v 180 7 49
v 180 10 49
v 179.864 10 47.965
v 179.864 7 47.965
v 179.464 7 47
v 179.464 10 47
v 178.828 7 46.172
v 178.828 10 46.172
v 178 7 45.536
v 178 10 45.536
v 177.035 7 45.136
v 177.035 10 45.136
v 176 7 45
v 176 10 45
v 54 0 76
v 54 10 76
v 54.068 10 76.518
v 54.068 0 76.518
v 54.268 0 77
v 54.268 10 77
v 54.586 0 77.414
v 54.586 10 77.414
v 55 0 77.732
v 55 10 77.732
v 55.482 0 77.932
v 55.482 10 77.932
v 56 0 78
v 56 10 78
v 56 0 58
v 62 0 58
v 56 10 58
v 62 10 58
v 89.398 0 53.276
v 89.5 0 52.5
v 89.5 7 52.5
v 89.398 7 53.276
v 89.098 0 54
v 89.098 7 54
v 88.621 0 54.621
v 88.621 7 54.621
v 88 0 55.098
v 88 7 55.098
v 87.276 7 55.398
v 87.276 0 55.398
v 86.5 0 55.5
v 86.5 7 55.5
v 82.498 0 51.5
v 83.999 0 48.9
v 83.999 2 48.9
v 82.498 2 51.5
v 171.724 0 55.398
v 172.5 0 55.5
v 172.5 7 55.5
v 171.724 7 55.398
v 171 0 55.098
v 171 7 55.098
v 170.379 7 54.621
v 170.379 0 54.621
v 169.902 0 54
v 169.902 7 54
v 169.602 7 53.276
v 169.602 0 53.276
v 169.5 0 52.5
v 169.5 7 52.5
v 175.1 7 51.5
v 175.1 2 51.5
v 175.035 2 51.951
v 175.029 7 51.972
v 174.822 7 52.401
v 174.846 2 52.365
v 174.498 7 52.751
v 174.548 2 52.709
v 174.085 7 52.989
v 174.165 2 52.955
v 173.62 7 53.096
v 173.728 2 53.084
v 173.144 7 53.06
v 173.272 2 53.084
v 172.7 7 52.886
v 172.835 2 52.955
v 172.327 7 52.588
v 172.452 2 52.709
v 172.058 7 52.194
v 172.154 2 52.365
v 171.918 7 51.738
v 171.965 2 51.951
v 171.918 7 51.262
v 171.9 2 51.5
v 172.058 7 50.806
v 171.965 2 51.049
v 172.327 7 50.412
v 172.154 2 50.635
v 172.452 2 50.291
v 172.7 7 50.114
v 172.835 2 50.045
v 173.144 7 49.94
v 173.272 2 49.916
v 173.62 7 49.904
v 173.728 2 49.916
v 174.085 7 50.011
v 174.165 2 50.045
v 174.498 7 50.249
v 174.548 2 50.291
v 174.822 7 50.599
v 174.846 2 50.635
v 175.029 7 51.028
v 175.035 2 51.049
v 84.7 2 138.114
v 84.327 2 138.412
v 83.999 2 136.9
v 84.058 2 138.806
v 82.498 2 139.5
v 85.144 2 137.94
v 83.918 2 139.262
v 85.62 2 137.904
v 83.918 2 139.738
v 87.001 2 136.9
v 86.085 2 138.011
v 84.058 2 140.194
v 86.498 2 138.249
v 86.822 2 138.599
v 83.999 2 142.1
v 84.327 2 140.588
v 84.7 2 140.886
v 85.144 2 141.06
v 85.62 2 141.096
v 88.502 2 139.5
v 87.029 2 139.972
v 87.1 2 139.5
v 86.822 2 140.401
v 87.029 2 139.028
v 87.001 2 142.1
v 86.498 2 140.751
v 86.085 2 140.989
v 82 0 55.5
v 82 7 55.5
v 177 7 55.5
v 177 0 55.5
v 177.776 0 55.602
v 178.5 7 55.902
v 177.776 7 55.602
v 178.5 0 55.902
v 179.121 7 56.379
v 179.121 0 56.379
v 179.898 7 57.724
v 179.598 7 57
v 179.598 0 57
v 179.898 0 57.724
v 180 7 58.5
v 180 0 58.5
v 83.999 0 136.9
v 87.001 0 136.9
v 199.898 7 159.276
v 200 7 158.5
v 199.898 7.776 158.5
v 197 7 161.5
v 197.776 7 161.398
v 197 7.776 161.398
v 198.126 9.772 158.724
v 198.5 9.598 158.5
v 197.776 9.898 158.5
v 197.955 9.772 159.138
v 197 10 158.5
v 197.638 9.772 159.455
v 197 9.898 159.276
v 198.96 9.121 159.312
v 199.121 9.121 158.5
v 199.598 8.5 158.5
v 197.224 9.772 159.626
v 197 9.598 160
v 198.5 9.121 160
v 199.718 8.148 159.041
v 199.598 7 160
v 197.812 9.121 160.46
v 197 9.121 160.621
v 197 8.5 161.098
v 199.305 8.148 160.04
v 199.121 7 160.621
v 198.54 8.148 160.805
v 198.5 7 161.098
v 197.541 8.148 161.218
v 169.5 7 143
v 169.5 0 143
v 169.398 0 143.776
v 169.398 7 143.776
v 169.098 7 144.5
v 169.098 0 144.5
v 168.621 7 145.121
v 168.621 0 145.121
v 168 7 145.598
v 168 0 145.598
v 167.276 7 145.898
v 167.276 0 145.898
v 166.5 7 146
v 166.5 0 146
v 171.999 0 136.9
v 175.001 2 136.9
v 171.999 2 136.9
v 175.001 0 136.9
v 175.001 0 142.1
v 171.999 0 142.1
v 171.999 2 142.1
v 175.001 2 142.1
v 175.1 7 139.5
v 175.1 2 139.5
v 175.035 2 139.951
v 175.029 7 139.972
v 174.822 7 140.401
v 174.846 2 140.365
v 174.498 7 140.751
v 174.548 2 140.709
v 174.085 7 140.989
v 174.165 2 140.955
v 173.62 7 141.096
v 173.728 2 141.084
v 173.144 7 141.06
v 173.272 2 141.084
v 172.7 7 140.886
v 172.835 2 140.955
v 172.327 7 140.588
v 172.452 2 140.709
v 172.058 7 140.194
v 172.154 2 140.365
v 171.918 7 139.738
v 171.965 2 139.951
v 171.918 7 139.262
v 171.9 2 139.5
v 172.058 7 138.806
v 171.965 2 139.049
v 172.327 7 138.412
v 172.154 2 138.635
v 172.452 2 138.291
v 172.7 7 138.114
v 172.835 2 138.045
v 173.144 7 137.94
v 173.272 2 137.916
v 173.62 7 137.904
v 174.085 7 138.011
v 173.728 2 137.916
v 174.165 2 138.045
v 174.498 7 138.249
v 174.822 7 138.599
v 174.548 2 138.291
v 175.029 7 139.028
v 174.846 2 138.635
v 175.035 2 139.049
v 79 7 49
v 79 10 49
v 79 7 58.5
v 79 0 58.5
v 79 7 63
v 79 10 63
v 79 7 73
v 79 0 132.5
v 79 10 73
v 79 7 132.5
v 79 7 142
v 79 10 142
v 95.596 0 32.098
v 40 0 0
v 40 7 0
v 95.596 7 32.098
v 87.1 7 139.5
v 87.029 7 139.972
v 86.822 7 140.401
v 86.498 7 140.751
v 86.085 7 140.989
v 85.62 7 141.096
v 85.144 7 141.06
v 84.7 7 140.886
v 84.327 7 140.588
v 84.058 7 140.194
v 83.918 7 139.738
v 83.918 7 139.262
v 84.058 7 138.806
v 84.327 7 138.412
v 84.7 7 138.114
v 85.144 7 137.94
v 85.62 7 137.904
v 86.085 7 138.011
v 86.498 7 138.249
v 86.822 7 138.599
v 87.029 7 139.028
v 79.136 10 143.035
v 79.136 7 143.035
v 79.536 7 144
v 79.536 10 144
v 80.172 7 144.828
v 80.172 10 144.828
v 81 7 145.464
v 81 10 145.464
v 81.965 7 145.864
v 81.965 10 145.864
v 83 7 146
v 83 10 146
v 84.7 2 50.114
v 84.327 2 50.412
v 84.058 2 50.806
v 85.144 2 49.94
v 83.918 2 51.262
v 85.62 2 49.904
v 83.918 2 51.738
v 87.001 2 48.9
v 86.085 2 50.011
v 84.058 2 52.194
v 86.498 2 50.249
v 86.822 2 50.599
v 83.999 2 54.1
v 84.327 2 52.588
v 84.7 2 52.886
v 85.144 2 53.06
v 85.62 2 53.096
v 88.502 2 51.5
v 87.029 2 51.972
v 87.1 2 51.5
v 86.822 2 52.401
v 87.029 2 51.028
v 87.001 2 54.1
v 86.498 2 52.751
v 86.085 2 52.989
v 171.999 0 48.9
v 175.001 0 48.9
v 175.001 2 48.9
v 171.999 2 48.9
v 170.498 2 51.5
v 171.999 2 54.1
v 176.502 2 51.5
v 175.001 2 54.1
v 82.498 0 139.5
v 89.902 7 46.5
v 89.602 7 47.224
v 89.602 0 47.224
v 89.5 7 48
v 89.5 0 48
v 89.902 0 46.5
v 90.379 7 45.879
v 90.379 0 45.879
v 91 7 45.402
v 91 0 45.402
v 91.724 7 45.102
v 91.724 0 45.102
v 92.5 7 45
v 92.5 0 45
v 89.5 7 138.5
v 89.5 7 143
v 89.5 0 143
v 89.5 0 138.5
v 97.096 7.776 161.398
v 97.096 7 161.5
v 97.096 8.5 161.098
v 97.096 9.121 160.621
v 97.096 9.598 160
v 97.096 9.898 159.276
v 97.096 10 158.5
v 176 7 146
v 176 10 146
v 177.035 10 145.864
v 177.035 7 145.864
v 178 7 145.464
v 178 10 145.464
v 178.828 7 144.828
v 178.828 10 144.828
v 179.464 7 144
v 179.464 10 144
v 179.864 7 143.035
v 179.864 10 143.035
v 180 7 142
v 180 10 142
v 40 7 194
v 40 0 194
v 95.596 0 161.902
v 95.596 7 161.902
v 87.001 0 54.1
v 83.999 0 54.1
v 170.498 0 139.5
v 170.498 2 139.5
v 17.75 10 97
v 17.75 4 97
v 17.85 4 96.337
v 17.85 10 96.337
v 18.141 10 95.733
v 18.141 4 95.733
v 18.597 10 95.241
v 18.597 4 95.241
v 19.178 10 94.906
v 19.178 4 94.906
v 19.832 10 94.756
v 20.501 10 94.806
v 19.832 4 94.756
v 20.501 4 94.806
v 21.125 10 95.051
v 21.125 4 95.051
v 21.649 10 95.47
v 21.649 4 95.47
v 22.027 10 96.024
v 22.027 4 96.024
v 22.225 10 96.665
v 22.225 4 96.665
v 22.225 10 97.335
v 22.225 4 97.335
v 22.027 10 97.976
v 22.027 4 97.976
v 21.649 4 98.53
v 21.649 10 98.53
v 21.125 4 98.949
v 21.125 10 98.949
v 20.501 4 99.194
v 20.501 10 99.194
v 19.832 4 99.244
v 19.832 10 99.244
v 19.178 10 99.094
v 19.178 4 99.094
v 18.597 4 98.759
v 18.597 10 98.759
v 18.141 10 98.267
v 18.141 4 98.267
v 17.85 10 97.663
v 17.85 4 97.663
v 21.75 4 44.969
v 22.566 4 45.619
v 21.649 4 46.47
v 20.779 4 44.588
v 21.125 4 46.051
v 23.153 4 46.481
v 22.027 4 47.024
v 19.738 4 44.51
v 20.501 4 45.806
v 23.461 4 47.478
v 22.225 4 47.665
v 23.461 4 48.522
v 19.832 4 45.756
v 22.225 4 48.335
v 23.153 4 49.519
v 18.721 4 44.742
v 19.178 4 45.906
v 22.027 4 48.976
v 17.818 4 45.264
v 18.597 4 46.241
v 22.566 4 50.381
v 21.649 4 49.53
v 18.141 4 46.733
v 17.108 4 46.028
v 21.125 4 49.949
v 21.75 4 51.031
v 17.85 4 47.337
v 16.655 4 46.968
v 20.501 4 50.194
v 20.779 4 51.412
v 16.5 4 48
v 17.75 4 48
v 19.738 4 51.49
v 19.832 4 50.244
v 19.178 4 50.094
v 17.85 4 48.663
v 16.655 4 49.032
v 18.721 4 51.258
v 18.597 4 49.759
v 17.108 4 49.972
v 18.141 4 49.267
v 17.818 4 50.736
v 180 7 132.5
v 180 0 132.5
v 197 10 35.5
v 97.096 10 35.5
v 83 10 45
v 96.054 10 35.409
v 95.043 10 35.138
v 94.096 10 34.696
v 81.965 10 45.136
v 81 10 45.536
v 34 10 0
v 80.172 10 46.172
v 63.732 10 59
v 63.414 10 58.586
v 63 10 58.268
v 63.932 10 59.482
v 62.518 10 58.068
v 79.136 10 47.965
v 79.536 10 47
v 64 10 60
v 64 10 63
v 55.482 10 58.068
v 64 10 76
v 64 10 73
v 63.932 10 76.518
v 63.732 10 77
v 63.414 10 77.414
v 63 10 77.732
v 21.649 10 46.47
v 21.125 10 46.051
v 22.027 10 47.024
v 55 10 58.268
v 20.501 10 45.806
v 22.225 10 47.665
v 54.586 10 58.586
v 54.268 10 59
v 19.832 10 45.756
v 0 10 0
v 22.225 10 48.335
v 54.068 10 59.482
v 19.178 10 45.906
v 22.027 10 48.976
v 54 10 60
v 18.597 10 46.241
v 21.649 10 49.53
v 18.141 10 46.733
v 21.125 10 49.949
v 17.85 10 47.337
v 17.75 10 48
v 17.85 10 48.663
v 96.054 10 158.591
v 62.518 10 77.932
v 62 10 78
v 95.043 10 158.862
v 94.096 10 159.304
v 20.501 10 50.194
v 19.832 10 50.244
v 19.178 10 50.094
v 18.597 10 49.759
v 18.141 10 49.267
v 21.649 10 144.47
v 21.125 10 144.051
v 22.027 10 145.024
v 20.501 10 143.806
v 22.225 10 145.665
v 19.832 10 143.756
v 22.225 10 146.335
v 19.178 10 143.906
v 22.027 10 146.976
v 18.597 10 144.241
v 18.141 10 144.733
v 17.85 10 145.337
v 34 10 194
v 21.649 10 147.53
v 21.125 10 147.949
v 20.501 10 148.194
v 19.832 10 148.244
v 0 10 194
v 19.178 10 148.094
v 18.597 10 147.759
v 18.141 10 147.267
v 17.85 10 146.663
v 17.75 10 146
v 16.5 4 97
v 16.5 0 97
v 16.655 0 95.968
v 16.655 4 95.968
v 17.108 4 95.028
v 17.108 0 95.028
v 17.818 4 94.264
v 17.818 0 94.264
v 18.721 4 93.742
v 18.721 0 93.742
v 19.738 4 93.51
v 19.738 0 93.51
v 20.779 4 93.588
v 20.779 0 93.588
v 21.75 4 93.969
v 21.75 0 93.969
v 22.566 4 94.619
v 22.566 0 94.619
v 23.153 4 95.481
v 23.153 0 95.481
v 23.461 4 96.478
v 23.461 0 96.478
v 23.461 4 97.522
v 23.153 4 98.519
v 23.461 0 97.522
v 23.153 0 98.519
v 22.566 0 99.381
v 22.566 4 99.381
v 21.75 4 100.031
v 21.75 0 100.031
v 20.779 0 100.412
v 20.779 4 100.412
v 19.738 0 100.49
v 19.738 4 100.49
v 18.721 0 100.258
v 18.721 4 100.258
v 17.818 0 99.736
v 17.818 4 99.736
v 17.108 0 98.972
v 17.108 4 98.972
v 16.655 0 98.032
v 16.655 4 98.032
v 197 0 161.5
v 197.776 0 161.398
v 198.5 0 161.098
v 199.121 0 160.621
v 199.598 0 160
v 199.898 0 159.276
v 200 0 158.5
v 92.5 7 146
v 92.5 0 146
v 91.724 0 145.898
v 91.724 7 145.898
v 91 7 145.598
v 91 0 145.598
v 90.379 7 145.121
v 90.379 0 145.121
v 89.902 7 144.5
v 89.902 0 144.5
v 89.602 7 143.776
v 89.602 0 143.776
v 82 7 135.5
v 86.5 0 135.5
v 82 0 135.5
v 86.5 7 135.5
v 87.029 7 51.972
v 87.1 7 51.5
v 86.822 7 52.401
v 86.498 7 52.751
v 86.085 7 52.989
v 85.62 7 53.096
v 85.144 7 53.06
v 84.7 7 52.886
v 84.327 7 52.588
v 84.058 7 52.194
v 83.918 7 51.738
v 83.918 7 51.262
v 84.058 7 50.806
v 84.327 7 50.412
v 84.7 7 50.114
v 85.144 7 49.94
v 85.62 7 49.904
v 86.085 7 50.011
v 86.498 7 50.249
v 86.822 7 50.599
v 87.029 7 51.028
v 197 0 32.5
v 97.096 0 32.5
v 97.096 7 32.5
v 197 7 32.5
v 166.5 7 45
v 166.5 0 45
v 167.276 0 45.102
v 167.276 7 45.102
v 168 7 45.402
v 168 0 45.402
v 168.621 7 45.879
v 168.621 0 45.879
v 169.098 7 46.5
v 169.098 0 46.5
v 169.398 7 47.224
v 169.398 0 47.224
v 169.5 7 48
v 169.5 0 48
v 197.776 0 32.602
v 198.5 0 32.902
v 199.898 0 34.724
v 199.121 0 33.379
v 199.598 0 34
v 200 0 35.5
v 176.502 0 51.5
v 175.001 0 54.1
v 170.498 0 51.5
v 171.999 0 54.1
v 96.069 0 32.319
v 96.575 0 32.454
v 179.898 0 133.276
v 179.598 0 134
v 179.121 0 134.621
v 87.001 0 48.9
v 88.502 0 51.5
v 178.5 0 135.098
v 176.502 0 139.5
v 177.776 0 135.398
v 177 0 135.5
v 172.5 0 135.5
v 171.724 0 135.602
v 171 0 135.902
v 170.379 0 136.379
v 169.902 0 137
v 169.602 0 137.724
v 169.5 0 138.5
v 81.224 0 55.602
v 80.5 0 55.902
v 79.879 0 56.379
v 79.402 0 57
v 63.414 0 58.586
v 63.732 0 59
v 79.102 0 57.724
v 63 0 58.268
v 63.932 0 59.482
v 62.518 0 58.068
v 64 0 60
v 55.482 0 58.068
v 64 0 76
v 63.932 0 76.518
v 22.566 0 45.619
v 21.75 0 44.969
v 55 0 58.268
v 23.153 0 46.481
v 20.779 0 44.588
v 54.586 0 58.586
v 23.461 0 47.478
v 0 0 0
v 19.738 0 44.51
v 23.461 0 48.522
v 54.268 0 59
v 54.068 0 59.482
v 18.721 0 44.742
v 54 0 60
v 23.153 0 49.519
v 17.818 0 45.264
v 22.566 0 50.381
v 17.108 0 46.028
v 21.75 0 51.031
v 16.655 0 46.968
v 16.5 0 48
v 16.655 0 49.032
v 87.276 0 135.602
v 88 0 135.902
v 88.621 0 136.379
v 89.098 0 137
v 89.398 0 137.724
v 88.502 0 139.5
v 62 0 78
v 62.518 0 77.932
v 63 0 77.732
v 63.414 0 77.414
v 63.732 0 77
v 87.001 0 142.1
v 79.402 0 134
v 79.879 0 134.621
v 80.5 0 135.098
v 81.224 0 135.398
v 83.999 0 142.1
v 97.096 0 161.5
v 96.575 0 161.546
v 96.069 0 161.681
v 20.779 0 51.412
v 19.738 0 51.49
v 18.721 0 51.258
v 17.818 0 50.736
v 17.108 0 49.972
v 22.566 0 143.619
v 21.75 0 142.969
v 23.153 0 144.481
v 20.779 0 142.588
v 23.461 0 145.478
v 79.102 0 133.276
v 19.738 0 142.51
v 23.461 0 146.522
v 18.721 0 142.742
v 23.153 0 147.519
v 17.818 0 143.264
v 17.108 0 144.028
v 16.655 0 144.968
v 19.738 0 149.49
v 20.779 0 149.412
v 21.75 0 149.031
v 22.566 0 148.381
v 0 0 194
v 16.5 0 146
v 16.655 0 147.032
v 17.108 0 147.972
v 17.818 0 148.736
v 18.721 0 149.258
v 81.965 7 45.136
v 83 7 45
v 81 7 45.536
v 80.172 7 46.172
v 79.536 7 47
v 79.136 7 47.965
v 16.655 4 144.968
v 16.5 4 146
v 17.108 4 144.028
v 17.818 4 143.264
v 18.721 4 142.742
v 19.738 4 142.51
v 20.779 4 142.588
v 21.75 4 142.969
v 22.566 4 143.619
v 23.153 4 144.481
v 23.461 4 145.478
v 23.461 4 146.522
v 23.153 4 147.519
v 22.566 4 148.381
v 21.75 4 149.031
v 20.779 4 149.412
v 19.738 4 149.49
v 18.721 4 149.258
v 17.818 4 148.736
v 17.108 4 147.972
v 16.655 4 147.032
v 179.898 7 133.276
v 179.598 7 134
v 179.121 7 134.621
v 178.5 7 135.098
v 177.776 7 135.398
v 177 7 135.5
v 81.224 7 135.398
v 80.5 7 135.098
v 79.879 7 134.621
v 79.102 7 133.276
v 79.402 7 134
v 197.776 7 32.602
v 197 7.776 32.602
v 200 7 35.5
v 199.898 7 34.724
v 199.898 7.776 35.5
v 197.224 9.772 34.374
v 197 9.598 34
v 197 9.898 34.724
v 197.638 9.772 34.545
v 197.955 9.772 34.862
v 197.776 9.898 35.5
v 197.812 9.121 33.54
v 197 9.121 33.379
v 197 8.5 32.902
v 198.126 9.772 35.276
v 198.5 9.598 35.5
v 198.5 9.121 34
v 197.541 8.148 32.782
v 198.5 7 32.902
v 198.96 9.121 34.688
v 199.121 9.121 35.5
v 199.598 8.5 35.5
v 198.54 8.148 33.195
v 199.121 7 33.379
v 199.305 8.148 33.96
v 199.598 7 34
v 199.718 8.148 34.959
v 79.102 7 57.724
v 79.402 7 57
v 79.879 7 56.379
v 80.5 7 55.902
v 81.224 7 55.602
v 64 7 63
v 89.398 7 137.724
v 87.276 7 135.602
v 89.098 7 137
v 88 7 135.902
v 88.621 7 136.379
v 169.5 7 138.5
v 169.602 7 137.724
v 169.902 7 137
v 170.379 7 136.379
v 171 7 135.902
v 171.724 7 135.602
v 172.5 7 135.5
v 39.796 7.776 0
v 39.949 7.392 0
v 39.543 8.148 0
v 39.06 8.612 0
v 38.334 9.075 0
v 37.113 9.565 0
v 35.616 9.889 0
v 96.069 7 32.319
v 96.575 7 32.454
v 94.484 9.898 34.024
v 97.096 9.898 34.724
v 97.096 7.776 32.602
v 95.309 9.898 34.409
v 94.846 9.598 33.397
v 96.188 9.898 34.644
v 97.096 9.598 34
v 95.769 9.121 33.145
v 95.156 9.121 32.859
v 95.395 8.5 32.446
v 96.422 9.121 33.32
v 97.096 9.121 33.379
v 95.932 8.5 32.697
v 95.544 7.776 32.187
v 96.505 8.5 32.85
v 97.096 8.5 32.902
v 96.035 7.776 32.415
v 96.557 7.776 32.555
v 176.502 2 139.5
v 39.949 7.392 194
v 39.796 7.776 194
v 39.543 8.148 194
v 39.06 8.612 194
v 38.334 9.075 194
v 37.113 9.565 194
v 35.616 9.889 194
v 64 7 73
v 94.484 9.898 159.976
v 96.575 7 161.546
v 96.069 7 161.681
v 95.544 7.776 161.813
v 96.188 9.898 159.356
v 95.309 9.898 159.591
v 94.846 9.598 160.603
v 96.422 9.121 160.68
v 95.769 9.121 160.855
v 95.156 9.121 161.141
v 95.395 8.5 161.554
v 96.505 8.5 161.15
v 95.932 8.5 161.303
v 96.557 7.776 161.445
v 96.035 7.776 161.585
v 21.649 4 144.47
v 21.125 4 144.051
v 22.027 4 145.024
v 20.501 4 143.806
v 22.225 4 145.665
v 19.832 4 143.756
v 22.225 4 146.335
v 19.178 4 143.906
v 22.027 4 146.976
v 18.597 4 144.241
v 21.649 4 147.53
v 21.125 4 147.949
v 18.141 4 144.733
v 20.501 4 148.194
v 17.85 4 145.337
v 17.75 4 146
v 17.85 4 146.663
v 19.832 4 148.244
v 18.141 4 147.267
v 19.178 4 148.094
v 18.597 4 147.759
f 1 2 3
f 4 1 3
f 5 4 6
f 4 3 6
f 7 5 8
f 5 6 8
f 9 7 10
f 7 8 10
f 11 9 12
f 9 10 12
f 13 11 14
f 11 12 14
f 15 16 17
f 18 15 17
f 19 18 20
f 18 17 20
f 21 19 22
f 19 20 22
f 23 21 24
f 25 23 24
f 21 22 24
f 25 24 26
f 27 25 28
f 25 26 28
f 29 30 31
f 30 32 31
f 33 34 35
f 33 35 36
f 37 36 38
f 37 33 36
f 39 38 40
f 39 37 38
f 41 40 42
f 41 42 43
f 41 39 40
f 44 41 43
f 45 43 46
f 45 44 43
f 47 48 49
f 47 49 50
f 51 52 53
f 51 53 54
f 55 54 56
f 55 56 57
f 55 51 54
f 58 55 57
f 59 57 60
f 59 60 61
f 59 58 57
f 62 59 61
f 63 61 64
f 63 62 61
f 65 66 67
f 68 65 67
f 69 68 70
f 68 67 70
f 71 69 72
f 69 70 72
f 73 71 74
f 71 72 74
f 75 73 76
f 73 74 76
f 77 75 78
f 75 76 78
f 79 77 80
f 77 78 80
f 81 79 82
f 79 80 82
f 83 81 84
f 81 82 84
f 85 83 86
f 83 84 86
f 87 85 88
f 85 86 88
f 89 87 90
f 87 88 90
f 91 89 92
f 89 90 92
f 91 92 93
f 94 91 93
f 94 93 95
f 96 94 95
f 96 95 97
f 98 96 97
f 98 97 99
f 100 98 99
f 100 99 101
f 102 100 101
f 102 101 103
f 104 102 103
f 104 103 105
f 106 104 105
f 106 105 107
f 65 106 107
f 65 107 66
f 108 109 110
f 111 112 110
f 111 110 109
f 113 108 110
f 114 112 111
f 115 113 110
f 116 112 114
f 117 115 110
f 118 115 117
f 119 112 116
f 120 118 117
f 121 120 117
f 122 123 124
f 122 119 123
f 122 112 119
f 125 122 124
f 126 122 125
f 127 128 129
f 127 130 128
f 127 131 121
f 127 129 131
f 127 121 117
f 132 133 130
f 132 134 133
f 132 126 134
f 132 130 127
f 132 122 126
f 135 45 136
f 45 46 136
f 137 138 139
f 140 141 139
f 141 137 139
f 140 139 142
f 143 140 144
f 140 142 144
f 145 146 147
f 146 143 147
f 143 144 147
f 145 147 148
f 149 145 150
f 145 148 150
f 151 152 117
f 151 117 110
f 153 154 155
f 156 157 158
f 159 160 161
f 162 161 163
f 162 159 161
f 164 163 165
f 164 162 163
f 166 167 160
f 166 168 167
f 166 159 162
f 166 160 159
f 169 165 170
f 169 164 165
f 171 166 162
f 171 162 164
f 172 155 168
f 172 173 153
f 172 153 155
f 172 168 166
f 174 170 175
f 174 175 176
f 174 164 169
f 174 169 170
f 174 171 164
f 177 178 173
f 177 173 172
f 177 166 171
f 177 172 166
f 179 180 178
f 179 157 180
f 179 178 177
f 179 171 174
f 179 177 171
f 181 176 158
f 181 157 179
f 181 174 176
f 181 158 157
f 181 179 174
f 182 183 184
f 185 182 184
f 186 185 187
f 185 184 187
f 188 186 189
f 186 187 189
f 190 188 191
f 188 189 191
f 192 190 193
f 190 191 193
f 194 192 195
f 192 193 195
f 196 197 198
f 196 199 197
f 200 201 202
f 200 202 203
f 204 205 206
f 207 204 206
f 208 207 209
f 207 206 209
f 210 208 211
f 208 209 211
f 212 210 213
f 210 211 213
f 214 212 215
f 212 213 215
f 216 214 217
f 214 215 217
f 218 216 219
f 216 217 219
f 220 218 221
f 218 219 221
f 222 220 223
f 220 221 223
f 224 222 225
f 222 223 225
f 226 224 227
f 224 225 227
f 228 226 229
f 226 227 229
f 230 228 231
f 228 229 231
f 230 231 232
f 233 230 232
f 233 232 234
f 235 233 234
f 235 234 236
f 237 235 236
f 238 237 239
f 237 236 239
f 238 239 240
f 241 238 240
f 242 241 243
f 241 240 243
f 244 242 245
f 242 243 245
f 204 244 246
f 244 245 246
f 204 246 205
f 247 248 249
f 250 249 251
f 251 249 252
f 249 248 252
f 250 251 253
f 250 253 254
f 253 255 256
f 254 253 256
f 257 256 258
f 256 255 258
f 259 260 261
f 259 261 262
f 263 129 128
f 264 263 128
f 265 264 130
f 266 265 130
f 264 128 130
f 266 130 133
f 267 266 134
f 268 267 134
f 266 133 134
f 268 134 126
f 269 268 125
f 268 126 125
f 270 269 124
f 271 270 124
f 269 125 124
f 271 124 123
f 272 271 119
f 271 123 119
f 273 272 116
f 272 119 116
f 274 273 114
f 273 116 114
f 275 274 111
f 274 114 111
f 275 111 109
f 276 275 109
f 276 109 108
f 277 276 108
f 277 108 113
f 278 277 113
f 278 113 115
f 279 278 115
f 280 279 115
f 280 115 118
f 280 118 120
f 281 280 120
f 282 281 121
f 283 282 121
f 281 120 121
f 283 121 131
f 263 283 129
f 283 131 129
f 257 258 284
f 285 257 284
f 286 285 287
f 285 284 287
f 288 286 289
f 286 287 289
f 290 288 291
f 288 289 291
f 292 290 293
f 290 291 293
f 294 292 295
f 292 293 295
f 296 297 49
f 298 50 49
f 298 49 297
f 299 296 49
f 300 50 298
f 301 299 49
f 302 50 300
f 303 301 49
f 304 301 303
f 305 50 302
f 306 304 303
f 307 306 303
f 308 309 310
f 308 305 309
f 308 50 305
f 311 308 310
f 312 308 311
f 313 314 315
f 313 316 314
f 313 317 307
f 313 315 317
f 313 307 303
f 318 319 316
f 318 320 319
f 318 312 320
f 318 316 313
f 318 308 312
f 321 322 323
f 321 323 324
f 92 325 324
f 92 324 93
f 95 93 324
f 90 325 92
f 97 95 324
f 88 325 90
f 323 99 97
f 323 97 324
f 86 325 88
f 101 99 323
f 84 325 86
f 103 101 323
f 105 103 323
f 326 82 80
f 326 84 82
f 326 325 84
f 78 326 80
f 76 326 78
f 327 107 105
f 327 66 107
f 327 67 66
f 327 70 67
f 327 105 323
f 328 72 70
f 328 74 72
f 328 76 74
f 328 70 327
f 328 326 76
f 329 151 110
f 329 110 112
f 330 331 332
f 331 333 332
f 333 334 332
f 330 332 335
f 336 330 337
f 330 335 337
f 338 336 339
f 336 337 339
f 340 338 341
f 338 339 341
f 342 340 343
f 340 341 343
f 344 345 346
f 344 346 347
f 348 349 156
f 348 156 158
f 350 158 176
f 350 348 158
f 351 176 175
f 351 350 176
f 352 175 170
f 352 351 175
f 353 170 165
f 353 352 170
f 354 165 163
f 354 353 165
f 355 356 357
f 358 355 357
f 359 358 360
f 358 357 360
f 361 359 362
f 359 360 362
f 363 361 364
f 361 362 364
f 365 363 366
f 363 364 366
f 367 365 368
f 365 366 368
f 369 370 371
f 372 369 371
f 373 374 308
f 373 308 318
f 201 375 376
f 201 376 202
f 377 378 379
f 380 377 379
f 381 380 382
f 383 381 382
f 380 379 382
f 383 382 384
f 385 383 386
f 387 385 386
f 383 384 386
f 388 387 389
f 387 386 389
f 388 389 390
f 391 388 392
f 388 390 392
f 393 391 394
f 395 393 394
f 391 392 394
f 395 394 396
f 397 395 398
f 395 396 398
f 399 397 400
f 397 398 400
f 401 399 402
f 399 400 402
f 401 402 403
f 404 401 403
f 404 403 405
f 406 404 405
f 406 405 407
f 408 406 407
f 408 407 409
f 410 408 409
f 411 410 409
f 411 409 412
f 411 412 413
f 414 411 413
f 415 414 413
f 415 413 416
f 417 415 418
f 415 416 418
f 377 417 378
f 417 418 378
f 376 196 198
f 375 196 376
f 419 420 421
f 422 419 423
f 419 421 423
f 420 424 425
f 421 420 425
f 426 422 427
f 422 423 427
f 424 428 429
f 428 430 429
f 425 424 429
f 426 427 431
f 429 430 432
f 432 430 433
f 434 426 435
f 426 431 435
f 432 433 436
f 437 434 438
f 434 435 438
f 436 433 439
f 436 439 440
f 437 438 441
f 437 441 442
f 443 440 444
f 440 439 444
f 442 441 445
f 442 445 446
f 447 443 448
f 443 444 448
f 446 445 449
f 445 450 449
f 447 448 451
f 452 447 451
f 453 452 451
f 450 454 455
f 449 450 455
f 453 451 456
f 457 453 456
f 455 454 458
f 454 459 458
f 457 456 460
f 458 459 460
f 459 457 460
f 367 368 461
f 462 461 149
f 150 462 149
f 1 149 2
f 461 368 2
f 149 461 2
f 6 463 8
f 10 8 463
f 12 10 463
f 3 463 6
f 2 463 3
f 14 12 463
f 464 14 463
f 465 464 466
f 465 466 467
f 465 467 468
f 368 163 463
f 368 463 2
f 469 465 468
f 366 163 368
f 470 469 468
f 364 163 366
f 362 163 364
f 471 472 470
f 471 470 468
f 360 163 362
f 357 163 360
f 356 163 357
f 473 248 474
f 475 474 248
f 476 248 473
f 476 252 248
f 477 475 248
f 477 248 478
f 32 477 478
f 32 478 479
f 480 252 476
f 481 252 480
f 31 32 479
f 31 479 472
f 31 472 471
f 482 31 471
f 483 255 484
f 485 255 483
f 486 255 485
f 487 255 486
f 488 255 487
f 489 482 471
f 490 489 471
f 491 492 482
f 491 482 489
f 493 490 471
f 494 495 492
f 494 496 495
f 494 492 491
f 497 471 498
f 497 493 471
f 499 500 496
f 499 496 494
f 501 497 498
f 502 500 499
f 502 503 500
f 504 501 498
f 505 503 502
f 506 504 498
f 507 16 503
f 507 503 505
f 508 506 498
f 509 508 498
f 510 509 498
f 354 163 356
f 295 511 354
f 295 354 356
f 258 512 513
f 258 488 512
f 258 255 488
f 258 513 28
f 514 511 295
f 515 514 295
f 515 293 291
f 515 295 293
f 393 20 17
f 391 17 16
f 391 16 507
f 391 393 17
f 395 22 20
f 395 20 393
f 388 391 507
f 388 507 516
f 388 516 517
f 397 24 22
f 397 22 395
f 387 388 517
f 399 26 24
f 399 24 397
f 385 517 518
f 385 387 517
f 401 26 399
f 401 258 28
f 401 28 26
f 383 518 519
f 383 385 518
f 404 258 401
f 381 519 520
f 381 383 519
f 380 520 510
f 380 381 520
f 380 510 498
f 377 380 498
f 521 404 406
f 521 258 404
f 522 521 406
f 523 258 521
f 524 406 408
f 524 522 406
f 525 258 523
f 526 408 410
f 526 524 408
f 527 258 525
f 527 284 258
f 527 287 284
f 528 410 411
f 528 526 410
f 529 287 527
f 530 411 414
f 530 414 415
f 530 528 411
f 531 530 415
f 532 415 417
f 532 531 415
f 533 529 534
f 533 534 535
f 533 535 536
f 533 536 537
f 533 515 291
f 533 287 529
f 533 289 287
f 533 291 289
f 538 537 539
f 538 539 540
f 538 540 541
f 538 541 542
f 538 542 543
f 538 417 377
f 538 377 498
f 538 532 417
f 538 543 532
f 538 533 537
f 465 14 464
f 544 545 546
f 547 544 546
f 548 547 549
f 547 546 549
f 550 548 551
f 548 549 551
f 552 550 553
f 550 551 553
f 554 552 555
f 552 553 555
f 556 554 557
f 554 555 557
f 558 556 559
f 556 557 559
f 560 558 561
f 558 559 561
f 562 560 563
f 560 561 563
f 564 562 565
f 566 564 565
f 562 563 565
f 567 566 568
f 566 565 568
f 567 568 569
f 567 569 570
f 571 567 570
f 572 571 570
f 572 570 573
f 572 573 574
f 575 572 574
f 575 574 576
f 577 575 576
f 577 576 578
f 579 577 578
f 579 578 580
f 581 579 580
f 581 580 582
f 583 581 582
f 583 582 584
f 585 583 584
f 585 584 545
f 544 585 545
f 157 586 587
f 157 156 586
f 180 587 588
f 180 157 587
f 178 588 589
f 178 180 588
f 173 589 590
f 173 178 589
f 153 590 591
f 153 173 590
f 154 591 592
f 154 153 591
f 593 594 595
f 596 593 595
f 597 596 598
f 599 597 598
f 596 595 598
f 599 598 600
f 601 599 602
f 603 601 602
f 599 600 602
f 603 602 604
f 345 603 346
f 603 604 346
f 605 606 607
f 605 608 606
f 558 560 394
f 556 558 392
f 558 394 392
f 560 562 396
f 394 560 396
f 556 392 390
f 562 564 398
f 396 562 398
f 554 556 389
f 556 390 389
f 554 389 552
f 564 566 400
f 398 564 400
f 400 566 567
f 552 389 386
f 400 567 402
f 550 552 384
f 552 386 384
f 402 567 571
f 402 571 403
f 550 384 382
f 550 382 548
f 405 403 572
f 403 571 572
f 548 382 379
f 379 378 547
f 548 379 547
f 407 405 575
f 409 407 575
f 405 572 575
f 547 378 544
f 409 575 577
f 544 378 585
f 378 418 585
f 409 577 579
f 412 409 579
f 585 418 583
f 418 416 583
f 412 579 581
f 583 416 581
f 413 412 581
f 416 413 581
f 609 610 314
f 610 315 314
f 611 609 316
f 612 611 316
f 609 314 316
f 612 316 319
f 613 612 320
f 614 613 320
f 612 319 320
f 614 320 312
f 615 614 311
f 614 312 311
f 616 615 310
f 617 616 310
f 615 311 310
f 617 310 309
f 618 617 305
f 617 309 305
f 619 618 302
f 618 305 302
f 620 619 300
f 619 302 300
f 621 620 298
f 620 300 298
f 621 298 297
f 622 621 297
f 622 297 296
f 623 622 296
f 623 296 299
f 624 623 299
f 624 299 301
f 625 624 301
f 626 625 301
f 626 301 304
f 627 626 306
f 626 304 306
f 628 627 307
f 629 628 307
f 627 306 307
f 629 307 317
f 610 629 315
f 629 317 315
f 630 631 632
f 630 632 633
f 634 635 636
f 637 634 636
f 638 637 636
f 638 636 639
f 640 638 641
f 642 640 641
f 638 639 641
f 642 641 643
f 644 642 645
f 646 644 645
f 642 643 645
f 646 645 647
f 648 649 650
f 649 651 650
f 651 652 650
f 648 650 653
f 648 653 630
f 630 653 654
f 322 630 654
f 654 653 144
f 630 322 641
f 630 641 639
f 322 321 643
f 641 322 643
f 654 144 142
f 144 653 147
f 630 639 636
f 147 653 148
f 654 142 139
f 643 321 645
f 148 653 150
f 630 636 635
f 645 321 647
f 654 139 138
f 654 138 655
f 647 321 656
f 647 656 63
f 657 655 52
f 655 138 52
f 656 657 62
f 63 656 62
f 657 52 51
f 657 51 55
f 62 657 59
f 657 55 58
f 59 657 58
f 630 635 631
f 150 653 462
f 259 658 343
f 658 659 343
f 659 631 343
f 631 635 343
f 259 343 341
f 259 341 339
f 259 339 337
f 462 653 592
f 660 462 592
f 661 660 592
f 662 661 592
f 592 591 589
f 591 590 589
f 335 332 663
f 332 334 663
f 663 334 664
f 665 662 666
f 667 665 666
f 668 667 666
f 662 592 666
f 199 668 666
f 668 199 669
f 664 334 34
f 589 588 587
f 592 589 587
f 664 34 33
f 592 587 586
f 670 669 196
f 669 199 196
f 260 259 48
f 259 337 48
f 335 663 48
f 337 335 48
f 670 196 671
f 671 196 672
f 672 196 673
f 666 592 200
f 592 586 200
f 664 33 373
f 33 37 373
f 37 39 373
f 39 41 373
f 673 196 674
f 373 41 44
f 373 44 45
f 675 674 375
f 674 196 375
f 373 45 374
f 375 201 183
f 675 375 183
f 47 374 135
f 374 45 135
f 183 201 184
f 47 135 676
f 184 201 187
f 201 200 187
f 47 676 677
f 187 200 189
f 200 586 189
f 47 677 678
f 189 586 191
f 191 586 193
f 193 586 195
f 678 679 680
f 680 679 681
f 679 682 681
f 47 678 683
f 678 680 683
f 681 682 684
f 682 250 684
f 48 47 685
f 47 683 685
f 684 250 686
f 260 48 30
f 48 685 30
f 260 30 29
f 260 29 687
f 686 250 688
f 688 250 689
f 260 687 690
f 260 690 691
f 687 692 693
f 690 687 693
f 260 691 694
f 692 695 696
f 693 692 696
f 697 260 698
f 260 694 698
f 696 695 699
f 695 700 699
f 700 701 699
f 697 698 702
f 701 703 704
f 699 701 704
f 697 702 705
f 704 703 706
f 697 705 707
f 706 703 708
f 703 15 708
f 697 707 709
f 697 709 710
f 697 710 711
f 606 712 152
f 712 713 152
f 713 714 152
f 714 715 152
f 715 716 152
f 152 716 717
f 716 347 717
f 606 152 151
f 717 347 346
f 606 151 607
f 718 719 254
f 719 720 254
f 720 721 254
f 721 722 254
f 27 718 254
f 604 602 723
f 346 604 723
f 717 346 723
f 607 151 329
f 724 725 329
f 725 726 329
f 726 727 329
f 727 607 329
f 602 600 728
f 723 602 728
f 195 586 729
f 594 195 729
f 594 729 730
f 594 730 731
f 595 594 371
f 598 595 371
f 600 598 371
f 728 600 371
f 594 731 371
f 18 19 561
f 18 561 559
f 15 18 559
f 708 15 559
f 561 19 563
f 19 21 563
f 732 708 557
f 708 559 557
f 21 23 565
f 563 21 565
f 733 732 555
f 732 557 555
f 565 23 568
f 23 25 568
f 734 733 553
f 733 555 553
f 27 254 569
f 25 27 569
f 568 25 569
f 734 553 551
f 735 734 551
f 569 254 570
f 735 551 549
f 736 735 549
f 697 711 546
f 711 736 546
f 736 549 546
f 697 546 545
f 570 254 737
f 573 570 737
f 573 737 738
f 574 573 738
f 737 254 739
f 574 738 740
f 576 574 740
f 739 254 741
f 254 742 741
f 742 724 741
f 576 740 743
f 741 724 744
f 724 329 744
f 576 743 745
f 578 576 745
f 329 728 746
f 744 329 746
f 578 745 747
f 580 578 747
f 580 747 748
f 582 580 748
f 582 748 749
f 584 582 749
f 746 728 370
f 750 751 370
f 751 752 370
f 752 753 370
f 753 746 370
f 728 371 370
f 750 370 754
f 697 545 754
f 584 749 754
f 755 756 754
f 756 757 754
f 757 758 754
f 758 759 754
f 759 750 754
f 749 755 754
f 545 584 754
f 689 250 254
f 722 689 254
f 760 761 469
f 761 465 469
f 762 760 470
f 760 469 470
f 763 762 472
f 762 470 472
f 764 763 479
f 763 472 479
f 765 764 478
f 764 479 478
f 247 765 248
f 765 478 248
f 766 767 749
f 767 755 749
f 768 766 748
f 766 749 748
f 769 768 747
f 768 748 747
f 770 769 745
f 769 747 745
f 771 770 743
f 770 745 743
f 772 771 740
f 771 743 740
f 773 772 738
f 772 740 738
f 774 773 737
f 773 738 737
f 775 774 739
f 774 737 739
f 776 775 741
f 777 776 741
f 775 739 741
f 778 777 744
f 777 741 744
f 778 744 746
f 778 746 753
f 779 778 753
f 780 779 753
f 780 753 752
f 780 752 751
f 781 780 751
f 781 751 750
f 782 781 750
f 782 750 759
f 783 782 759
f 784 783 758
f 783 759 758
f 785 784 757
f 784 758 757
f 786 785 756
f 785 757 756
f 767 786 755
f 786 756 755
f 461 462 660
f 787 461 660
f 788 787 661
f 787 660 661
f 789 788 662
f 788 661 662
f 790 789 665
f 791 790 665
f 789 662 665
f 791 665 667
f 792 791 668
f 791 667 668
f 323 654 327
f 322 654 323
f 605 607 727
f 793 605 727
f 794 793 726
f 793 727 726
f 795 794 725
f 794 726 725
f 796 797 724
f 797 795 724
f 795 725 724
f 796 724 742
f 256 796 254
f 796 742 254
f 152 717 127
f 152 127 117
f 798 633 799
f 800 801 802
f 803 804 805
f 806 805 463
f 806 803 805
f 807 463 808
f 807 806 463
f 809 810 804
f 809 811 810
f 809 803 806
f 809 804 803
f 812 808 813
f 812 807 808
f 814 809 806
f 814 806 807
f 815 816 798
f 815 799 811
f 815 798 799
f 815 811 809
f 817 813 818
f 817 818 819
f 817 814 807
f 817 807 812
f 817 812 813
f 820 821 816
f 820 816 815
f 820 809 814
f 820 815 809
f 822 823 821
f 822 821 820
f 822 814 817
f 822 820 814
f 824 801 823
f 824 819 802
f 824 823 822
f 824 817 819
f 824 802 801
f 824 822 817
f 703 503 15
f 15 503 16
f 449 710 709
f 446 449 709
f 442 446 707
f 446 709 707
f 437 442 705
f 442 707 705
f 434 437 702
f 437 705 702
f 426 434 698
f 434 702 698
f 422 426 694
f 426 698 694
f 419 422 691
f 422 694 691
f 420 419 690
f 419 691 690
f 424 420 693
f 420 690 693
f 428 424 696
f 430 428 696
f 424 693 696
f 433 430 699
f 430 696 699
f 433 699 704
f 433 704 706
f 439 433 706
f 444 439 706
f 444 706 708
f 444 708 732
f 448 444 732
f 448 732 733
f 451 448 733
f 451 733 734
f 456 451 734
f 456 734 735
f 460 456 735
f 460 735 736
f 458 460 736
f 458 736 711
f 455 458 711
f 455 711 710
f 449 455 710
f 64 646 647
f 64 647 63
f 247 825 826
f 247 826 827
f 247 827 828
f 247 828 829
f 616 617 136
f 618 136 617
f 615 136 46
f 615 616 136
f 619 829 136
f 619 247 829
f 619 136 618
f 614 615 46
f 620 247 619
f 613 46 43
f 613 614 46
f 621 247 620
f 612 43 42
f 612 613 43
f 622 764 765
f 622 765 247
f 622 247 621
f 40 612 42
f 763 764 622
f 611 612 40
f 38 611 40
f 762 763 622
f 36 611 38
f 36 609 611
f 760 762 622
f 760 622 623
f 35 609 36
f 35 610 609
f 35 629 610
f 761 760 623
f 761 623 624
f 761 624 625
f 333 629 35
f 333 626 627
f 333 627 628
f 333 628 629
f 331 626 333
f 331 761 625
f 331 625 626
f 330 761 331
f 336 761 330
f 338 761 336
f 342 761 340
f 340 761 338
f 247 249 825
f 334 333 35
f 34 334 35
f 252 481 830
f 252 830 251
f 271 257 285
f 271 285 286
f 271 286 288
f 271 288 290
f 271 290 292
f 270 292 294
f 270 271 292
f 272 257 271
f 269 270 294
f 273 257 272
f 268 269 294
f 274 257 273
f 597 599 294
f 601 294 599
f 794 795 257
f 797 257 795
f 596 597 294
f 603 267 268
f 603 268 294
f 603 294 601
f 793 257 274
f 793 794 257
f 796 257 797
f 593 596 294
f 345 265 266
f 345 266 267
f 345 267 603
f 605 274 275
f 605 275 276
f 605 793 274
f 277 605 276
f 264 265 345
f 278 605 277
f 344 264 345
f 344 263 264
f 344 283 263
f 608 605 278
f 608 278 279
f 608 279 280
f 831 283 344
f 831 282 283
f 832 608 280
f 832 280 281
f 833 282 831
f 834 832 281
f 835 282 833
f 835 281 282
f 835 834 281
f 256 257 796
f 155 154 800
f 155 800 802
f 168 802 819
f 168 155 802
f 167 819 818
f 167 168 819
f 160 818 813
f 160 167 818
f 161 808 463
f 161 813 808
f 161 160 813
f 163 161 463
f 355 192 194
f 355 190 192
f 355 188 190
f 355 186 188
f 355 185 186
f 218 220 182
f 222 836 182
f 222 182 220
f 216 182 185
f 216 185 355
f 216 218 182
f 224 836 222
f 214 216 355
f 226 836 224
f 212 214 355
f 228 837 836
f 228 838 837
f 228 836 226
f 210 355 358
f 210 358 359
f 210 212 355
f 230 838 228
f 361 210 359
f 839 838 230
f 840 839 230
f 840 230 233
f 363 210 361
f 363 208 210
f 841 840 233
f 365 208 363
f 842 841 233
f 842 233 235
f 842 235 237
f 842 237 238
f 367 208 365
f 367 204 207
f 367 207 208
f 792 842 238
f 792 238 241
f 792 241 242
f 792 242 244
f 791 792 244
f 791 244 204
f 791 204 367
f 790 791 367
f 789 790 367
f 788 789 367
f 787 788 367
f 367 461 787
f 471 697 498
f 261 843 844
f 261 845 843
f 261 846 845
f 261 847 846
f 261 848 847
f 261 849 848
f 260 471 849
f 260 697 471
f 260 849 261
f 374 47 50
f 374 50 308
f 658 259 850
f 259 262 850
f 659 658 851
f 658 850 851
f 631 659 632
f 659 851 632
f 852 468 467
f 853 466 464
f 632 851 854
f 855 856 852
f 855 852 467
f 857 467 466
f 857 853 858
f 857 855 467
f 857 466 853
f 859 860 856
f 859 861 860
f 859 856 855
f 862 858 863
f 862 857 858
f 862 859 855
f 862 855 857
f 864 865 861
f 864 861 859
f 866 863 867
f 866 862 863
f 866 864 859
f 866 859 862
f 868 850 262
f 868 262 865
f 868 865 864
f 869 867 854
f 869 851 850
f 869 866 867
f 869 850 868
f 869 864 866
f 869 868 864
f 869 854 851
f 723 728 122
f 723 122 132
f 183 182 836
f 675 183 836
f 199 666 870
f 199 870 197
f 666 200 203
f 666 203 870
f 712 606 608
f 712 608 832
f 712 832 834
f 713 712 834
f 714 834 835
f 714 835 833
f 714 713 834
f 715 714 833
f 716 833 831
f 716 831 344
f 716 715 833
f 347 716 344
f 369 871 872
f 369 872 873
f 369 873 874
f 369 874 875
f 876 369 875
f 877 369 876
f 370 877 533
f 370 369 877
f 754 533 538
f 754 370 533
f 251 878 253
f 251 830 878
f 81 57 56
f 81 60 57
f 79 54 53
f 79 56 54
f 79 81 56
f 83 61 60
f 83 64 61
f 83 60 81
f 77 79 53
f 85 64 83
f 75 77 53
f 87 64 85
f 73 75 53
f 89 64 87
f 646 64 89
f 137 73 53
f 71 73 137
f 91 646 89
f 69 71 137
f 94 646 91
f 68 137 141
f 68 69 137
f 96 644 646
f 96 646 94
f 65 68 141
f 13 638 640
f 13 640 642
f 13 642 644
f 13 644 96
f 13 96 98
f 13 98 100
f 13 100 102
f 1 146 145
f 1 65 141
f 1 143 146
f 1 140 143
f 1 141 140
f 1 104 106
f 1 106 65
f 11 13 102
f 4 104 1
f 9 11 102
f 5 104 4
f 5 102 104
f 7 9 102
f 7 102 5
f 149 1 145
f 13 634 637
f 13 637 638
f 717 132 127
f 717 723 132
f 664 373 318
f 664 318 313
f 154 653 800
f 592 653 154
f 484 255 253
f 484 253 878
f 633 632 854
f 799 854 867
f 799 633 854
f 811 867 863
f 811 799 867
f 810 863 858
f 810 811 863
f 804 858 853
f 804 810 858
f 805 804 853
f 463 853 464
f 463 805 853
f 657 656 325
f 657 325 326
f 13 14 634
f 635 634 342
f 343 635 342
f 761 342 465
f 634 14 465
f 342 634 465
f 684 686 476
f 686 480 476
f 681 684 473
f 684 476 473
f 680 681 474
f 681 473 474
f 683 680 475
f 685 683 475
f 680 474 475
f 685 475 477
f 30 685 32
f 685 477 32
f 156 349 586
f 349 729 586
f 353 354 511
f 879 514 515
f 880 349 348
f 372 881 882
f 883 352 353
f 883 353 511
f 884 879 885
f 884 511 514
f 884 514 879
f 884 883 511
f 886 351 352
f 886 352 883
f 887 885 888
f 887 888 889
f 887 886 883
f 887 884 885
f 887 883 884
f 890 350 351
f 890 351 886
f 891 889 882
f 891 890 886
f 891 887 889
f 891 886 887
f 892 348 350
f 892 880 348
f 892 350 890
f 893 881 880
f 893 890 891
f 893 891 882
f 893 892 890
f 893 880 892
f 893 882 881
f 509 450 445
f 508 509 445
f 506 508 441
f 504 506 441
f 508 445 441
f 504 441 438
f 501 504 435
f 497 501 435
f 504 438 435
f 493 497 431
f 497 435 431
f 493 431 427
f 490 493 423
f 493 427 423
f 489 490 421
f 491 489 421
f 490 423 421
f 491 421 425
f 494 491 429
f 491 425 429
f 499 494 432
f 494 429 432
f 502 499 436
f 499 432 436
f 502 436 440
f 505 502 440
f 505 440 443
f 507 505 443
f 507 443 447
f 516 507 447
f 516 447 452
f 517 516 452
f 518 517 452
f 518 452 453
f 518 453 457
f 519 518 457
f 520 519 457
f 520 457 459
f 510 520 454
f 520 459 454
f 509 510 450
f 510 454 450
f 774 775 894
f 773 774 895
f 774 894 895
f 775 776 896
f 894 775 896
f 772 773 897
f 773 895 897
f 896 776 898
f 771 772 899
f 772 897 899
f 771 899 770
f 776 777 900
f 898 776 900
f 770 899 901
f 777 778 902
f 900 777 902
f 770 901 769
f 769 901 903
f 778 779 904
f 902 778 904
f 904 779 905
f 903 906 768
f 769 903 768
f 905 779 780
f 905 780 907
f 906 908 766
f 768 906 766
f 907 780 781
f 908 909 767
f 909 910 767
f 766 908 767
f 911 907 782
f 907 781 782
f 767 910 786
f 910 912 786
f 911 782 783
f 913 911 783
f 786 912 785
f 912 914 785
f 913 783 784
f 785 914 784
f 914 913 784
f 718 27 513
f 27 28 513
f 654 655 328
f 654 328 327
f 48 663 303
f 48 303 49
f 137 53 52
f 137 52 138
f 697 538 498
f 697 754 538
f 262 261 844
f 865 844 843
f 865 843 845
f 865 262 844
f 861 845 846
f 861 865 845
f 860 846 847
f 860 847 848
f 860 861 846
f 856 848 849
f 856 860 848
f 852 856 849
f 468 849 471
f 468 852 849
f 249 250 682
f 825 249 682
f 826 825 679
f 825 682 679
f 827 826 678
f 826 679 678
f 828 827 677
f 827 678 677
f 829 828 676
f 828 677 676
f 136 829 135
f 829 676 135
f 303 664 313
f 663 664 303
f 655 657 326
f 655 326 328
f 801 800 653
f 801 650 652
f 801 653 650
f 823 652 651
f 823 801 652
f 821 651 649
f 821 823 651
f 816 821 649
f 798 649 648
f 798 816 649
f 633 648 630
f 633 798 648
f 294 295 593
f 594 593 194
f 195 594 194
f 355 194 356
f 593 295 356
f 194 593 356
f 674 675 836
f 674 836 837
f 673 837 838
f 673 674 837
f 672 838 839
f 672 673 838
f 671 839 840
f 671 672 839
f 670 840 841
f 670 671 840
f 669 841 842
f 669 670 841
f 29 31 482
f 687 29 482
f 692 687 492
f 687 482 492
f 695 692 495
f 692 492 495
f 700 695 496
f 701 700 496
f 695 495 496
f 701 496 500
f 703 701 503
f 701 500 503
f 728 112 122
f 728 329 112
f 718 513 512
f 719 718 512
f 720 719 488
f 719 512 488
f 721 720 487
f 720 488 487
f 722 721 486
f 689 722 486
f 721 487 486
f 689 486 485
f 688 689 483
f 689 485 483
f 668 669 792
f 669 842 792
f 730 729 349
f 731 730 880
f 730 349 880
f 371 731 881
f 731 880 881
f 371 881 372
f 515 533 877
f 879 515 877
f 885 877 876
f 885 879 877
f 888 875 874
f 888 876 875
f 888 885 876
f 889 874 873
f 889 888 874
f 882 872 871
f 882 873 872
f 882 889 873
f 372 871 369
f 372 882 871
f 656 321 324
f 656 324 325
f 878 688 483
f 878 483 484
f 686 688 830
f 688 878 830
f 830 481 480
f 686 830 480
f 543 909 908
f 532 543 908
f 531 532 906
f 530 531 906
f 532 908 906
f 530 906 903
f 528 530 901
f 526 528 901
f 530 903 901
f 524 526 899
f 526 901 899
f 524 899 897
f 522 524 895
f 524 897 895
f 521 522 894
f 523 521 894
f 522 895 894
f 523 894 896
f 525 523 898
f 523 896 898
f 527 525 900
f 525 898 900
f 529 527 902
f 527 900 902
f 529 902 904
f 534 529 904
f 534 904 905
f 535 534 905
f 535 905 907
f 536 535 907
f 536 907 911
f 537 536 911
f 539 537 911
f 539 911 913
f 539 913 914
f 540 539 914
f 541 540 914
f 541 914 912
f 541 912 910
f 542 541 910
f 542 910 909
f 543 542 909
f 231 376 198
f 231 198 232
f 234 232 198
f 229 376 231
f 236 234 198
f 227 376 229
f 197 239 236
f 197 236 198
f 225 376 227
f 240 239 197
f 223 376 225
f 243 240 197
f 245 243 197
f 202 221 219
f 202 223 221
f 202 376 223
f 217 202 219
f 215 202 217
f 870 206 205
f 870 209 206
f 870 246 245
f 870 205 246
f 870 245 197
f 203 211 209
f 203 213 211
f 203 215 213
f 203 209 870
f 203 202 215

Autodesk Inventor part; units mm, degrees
ref_plane "YZ Plane" through (0, 0, 0) normal (1, 0, 0) x (0, 1, 0)
ref_plane "XZ Plane" through (0, 0, 0) normal (0, 1, 0) x (-1, 0, 0)
ref_plane "XY Plane" through (0, 0, 0) normal (0, 0, 1) x (1, 0, 0)
sketch "스케치1" plane through (0, 0, 0) normal (0, 1, 0) x (-1, 0, 0)
  line L0 (0, 0) -> (-206, 0)
  line L1 (-210, 4) -> (-210, 190)
  line L2 (-206, 194) -> (0, 194)
  line L3 (0, 194) -> (0, 0)
  line L4 (-40, 0) -> (-40, 194)
  line L5 (-20, 0) -> (-20, 194)
  circle A0 centre (-20, 97) radius 3.5
  circle A1 centre (-20, 48) radius 3.5
  circle A2 centre (-20, 146) radius 3.5
  arc A3 (-210, 4) -> (-206, 0) centre (-206, 4) ccw
  arc A4 (-206, 194) -> (-210, 190) centre (-206, 190) ccw
  circle A5 centre (-20, 97) radius 2.25
  circle A6 centre (-20, 146) radius 2.25
  circle A7 centre (-20, 48) radius 2.25
  line L6 (-40, 194) -> (-96.2917, 161.5)
  line L7 (-40, 194) -> (25, 194) construction
  line L8 (-96.2917, 161.5) -> (-166.2917, 161.5)
  line L9 (-166.2917, 161.5) -> (-189.6101, 194)
  line L10 (-210, 161.5) -> (-200, 144.1795)
  line L11 (-210, 161.5) -> (-190, 161.5) construction
  line L12 (-210, 97) -> (-40, 97)
  line L13 (-40, 0) -> (-96.2917, 32.5)
  line L14 (-96.2917, 32.5) -> (-166.2917, 32.5)
  line L15 (-166.2917, 32.5) -> (-189.6101, 0)
  line L16 (-210, 32.5) -> (-200, 49.8205)
  line L17 (-200, 144.1795) -> (-200, 49.8205)
  line L18 (-166.2917, 32.5) -> (-200, 32.5)
  line L19 (-200, 32.5) -> (-200, 49.8205)
  line L20 (-200, 144.1795) -> (-200, 161.5)
  line L21 (-166.2917, 161.5) -> (-200, 161.5)
  point P0 (-210, 194)
  point P1 (-210, 0)
  dimension "d0" = 210
  dimension "d1" = 194
  dimension "d2" = 40
  dimension "d3" = 20
  dimension "d4" = 7
  dimension "d5" = 7
  dimension "d6" = 7
  dimension "d7" = 49
  dimension "d8" = 49
  dimension "d9" = 4
  dimension "d17" = 4.5
  dimension "d18" = 4.5
  dimension "d19" = 4.5
  dimension "d82" = 65
  dimension "d83" = 150
  dimension "d84" = 70
  dimension "d85" = 40
  dimension "d86" = 20
  dimension "d87" = 60
extrude "돌출1" add sketch "스케치1" along normal blind 10
extrude "돌출2" cut sketch "스케치1" along normal blind 3 contours A1 L5 A7 | L5 A7 A1 | A7 L5 | L5 A7 | A2 L5 A6 | L5 A6 A2 | A0 L5 A5 | L5 A5 A0 | A6 L5 | L5 A6 | A5 L5 | L5 A5
sketch "스케치2" plane through (0, 0, 0) normal (0, -1, 0) x (1, 0, 0)
  line L0 (176, 45) -> (83, 45)
  line L1 (79, 49) -> (79, 142)
  line L2 (83, 146) -> (176, 146)
  line L3 (180, 142) -> (180, 49)
  line L4 (206, 0) -> (0, 0) projected
  line L5 (210, 190) -> (210, 4) projected
  arc A0 (176, 45) -> (180, 49) centre (176, 49) ccw
  arc A1 (180, 142) -> (176, 146) centre (176, 142) ccw
  arc A2 (83, 146) -> (79, 142) centre (83, 142) ccw
  arc A3 (79, 49) -> (83, 45) centre (83, 49) ccw
  line L6 (180, 45) -> (169.5, 45)
  line L7 (169.5, 45) -> (169.5, 55.5)
  line L8 (169.5, 55.5) -> (180, 55.5)
  line L9 (180, 55.5) -> (180, 45)
  line L10 (79, 45) -> (89.5, 45)
  line L11 (89.5, 45) -> (89.5, 55.5)
  line L12 (89.5, 55.5) -> (79, 55.5)
  line L13 (79, 55.5) -> (79, 45)
  line L14 (180, 146) -> (169.5, 146)
  line L15 (169.5, 146) -> (169.5, 135.5)
  line L16 (169.5, 135.5) -> (180, 135.5)
  line L17 (180, 135.5) -> (180, 146)
  line L18 (79, 146) -> (89.5, 146)
  line L19 (89.5, 146) -> (89.5, 135.5)
  line L20 (89.5, 135.5) -> (79, 135.5)
  line L21 (79, 135.5) -> (79, 146)
  circle A4 centre (173.5, 51.5) radius 1.6
  circle A5 centre (85.5, 51.5) radius 1.6
  circle A6 centre (85.5, 139.5) radius 1.6
  circle A7 centre (173.5, 139.5) radius 1.6
  line L22 (173.5, 51.5) -> (169.5, 51.5)
  line L23 (170.4978, 51.5) -> (171.9989, 54.1)
  line L24 (171.9989, 54.1) -> (175.0011, 54.1)
  line L25 (175.0011, 54.1) -> (176.5022, 51.5)
  line L26 (176.5022, 51.5) -> (175.0011, 48.9)
  line L27 (175.0011, 48.9) -> (171.9989, 48.9)
  line L28 (171.9989, 48.9) -> (170.4978, 51.5)
  line L29 (85.5, 51.5) -> (89.5, 51.5)
  line L30 (88.5022, 51.5) -> (87.0011, 48.9)
  line L31 (87.0011, 48.9) -> (83.9989, 48.9)
  line L32 (83.9989, 48.9) -> (82.4978, 51.5)
  line L33 (82.4978, 51.5) -> (83.9989, 54.1)
  line L34 (83.9989, 54.1) -> (87.0011, 54.1)
  line L35 (87.0011, 54.1) -> (88.5022, 51.5)
  line L36 (85.5, 139.5) -> (89.5, 139.5)
  line L37 (88.5022, 139.5) -> (87.0011, 136.9)
  line L38 (87.0011, 136.9) -> (83.9989, 136.9)
  line L39 (83.9989, 136.9) -> (82.4978, 139.5)
  line L40 (82.4978, 139.5) -> (83.9989, 142.1)
  line L41 (83.9989, 142.1) -> (87.0011, 142.1)
  line L42 (87.0011, 142.1) -> (88.5022, 139.5)
  line L43 (173.5, 139.5) -> (169.5, 139.5)
  line L44 (170.4978, 139.5) -> (171.9989, 142.1)
  line L45 (171.9989, 142.1) -> (175.0011, 142.1)
  line L46 (175.0011, 142.1) -> (176.5022, 139.5)
  line L47 (176.5022, 139.5) -> (175.0011, 136.9)
  line L48 (175.0011, 136.9) -> (171.9989, 136.9)
  line L49 (171.9989, 136.9) -> (170.4978, 139.5)
  point P0 (174.75, 55.5)
  dimension "d14" = 101
  dimension "d15" = 101
  dimension "d16" = 45
  dimension "d24" = 30
  dimension "d25" = 4
  dimension "d26" = 10.5
  dimension "d27" = 10.5
  dimension "d28" = 10.5
  dimension "d29" = 10.5
  dimension "d30" = 10.5
  dimension "d31" = 10.5
  dimension "d32" = 10.5
  dimension "d33" = 10.5
  dimension "d34" = 3.2
  dimension "d36" = 4
  dimension "d37" = 3.2
  dimension "d38" = 4
  dimension "d39" = 4
  dimension "d40" = 3.2
  dimension "d41" = 4
  dimension "d42" = 4
  dimension "d43" = 3.2
  dimension "d44" = 4
  dimension "d45" = 4
  dimension "d46" = 4
  dimension "d58" = 5.2
  dimension "d59" = 5.2
  dimension "d60" = 5.2
  dimension "d61" = 5.2
  dimension "d95" = 88
extrude "돌출3" cut sketch "스케치1" along normal blind 4 contours A1 L5 A7 | L5 A7 A1 | A7 L5 | L5 A7 | A2 L5 A6 | L5 A6 A2 | A0 L5 A5 | L5 A5 A0 | A6 L5 | L5 A6 | A5 L5 | L5 A5
extrude "돌출4" cut sketch "스케치1" along normal blind 10 contours A7 L5 | L5 A7 | A6 L5 | L5 A6 | A5 L5 | L5 A5
sketch "스케치4" plane through (0, 10, 0) normal (0, 1, 0) x (1, 0, 0)
  line L0 (176, -45) -> (83, -45) projected
  line L1 (180, -142) -> (180, -49) projected
  line L2 (79, -49) -> (79, -142) projected
  line L3 (83, -146) -> (176, -146) projected
  line L4 (79, -135.5) -> (79, -146) projected
  line L5 (79, -146) -> (89.5, -146) projected
  line L6 (180, -135.5) -> (180, -146) projected
  line L7 (180, -146) -> (169.5, -146) projected
  line L8 (180, -45) -> (169.5, -45) projected
  line L9 (180, -55.5) -> (180, -45) projected
  line L10 (79, -45) -> (89.5, -45) projected
  line L11 (79, -55.5) -> (79, -45) projected
  arc A0 (83, -45) -> (79, -49) centre (83, -49) ccw projected
  arc A1 (180, -49) -> (176, -45) centre (176, -49) ccw projected
  arc A2 (176, -146) -> (180, -142) centre (176, -142) ccw projected
  arc A3 (79, -142) -> (83, -146) centre (83, -142) ccw projected
  point P0 (0, 0)
extrude "돌출6" cut sketch "스케치4" against normal blind 3 contours A1 L1 A2 L3 A3 L2 A0 L0
extrude "돌출7" cut sketch "스케치2" against normal blind 10 contours A4 | A5 | A7 | A6
extrude "돌출8" cut sketch "스케치2" against normal blind 2 contours A4 | L23 L24 L25 L26 L27 L28 | A5 | L30 L31 L32 L33 L34 L35 | A7 | L44 L45 L46 L47 L48 L49 | A6 | L37 L38 L39 L40 L41 L42
sketch "스케치5" plane through (0, 7, 0) normal (0, 1, 0) x (1, 0, 0)
  line L0 (89.5, -55.5) -> (79, -55.5) projected
  line L1 (89.5, -45) -> (89.5, -55.5) projected
  line L2 (176, -45) -> (83, -45) projected
  line L3 (169.5, -45) -> (169.5, -55.5) projected
  line L4 (169.5, -55.5) -> (180, -55.5) projected
  line L5 (180, -142) -> (180, -49) projected
  line L6 (169.5, -135.5) -> (180, -135.5) projected
  line L7 (169.5, -146) -> (169.5, -135.5) projected
  line L8 (83, -146) -> (176, -146) projected
  line L9 (89.5, -146) -> (89.5, -135.5) projected
  line L10 (89.5, -135.5) -> (79, -135.5) projected
  line L11 (79, -49) -> (79, -142) projected
  point P0 (0, 0)
extrude "돌출9" cut sketch "스케치5" against normal blind 10
fillet "모깎기2" radius 3 12 edges at (169.5, 3.5, 55.5) (169.5, 3.5, 45) (180, 3.5, 55.5) (180, 3.5, 135.5) (169.5, 3.5, 135.5) (169.5, 3.5, 146) (89.5, 3.5, 146) (89.5, 3.5, 135.5) (79, 3.5, 135.5) (89.5, 3.5, 45) (79, 3.5, 55.5) (89.5, 3.5, 55.5)
extrude "돌출14" cut sketch "스케치1" along normal blind 10 contours L0 L15 L14 L13 | L6 L8 L9 L2
extrude "돌출15" cut sketch "스케치1" along normal blind 10 contours L17 L16 L1 L12 | L12 L1 L10 L17
extrude "돌출16" cut sketch "스케치1" along normal blind 10 contours L0 A3 L1 L16 L19 L18 L15 | L9 L21 L20 L10 L1 A4 L2
fillet "모깎기5" radius 3 9 edges at (200, 5, 32.5) (200, 5, 161.5) (148.1458, 10, 32.5) (200, 10, 97) (148.1458, 10, 161.5) (68.1458, 10, 16.25) (96.2917, 5, 32.5) (96.2917, 5, 161.5) (68.1458, 10, 177.75)
sketch "스케치11" plane through (0, 10, 0) normal (0, 1, 0) x (1, 0, 0)
  line L0 (34, 0) -> (94.0955, -34.6962) projected
  line L1 (34, 0) -> (0, 0) projected
  line L2 (0, 0) -> (0, -194) projected
  line L3 (0, -194) -> (34, -194) projected
  line L4 (94.0955, -159.3038) -> (34, -194) projected
  arc A0 (97.0955, -158.5) -> (94.0955, -159.3038) centre (97.0955, -164.5) ccw projected
  line L5 (197, -158.5) -> (97.0955, -158.5) projected
  line L6 (197, -35.5) -> (197, -158.5) projected
  line L7 (97.0955, -35.5) -> (197, -35.5) projected
  arc A1 (94.0955, -34.6962) -> (97.0955, -35.5) centre (97.0955, -29.5) ccw projected
  circle A2 centre (20, -48) radius 2.25 projected
  circle A3 centre (20, -97) radius 2.25 projected
  circle A4 centre (20, -146) radius 2.25 projected
  arc A5 (176, -146) -> (180, -142) centre (176, -142) ccw projected
  line L8 (176, -146) -> (83, -146) projected
  arc A6 (79, -142) -> (83, -146) centre (83, -142) ccw projected
  line L9 (79, -142) -> (79, -49) projected
  arc A7 (83, -45) -> (79, -49) centre (83, -49) ccw projected
  line L10 (83, -45) -> (176, -45) projected
  arc A8 (180, -49) -> (176, -45) centre (176, -49) ccw projected
  line L11 (180, -49) -> (180, -142) projected
  line L12 (210, -97) -> (40, -97) projected
  arc A9 (54, -76) -> (56, -78) centre (56, -76) ccw
  line L13 (56, -78) -> (62, -78)
  arc A10 (62, -78) -> (64, -76) centre (62, -76) ccw
  line L14 (64, -76) -> (64, -60)
  arc A11 (64, -60) -> (62, -58) centre (62, -60) ccw
  line L15 (62, -58) -> (56, -58)
  arc A12 (56, -58) -> (54, -60) centre (56, -60) ccw
  line L16 (54, -60) -> (54, -76)
  line L17 (79, -58.5) -> (79, -132.5) projected
  line L18 (79, -73) -> (64, -73)
  line L19 (64, -73) -> (64, -63)
  line L20 (64, -63) -> (79, -63)
  line L21 (79, -63) -> (79, -73)
  dimension "d104" = 3
  dimension "d105" = 3
extrude "돌출19" cut sketch "스케치11" against normal blind 3 contours L18 L14 L20 L9
extrude "돌출20" cut sketch "스케치11" against normal blind 10 contours L14 A10 L13 A9 L16 A12 L15 A11
properties part number "XY_STAGE_BOARD1"
